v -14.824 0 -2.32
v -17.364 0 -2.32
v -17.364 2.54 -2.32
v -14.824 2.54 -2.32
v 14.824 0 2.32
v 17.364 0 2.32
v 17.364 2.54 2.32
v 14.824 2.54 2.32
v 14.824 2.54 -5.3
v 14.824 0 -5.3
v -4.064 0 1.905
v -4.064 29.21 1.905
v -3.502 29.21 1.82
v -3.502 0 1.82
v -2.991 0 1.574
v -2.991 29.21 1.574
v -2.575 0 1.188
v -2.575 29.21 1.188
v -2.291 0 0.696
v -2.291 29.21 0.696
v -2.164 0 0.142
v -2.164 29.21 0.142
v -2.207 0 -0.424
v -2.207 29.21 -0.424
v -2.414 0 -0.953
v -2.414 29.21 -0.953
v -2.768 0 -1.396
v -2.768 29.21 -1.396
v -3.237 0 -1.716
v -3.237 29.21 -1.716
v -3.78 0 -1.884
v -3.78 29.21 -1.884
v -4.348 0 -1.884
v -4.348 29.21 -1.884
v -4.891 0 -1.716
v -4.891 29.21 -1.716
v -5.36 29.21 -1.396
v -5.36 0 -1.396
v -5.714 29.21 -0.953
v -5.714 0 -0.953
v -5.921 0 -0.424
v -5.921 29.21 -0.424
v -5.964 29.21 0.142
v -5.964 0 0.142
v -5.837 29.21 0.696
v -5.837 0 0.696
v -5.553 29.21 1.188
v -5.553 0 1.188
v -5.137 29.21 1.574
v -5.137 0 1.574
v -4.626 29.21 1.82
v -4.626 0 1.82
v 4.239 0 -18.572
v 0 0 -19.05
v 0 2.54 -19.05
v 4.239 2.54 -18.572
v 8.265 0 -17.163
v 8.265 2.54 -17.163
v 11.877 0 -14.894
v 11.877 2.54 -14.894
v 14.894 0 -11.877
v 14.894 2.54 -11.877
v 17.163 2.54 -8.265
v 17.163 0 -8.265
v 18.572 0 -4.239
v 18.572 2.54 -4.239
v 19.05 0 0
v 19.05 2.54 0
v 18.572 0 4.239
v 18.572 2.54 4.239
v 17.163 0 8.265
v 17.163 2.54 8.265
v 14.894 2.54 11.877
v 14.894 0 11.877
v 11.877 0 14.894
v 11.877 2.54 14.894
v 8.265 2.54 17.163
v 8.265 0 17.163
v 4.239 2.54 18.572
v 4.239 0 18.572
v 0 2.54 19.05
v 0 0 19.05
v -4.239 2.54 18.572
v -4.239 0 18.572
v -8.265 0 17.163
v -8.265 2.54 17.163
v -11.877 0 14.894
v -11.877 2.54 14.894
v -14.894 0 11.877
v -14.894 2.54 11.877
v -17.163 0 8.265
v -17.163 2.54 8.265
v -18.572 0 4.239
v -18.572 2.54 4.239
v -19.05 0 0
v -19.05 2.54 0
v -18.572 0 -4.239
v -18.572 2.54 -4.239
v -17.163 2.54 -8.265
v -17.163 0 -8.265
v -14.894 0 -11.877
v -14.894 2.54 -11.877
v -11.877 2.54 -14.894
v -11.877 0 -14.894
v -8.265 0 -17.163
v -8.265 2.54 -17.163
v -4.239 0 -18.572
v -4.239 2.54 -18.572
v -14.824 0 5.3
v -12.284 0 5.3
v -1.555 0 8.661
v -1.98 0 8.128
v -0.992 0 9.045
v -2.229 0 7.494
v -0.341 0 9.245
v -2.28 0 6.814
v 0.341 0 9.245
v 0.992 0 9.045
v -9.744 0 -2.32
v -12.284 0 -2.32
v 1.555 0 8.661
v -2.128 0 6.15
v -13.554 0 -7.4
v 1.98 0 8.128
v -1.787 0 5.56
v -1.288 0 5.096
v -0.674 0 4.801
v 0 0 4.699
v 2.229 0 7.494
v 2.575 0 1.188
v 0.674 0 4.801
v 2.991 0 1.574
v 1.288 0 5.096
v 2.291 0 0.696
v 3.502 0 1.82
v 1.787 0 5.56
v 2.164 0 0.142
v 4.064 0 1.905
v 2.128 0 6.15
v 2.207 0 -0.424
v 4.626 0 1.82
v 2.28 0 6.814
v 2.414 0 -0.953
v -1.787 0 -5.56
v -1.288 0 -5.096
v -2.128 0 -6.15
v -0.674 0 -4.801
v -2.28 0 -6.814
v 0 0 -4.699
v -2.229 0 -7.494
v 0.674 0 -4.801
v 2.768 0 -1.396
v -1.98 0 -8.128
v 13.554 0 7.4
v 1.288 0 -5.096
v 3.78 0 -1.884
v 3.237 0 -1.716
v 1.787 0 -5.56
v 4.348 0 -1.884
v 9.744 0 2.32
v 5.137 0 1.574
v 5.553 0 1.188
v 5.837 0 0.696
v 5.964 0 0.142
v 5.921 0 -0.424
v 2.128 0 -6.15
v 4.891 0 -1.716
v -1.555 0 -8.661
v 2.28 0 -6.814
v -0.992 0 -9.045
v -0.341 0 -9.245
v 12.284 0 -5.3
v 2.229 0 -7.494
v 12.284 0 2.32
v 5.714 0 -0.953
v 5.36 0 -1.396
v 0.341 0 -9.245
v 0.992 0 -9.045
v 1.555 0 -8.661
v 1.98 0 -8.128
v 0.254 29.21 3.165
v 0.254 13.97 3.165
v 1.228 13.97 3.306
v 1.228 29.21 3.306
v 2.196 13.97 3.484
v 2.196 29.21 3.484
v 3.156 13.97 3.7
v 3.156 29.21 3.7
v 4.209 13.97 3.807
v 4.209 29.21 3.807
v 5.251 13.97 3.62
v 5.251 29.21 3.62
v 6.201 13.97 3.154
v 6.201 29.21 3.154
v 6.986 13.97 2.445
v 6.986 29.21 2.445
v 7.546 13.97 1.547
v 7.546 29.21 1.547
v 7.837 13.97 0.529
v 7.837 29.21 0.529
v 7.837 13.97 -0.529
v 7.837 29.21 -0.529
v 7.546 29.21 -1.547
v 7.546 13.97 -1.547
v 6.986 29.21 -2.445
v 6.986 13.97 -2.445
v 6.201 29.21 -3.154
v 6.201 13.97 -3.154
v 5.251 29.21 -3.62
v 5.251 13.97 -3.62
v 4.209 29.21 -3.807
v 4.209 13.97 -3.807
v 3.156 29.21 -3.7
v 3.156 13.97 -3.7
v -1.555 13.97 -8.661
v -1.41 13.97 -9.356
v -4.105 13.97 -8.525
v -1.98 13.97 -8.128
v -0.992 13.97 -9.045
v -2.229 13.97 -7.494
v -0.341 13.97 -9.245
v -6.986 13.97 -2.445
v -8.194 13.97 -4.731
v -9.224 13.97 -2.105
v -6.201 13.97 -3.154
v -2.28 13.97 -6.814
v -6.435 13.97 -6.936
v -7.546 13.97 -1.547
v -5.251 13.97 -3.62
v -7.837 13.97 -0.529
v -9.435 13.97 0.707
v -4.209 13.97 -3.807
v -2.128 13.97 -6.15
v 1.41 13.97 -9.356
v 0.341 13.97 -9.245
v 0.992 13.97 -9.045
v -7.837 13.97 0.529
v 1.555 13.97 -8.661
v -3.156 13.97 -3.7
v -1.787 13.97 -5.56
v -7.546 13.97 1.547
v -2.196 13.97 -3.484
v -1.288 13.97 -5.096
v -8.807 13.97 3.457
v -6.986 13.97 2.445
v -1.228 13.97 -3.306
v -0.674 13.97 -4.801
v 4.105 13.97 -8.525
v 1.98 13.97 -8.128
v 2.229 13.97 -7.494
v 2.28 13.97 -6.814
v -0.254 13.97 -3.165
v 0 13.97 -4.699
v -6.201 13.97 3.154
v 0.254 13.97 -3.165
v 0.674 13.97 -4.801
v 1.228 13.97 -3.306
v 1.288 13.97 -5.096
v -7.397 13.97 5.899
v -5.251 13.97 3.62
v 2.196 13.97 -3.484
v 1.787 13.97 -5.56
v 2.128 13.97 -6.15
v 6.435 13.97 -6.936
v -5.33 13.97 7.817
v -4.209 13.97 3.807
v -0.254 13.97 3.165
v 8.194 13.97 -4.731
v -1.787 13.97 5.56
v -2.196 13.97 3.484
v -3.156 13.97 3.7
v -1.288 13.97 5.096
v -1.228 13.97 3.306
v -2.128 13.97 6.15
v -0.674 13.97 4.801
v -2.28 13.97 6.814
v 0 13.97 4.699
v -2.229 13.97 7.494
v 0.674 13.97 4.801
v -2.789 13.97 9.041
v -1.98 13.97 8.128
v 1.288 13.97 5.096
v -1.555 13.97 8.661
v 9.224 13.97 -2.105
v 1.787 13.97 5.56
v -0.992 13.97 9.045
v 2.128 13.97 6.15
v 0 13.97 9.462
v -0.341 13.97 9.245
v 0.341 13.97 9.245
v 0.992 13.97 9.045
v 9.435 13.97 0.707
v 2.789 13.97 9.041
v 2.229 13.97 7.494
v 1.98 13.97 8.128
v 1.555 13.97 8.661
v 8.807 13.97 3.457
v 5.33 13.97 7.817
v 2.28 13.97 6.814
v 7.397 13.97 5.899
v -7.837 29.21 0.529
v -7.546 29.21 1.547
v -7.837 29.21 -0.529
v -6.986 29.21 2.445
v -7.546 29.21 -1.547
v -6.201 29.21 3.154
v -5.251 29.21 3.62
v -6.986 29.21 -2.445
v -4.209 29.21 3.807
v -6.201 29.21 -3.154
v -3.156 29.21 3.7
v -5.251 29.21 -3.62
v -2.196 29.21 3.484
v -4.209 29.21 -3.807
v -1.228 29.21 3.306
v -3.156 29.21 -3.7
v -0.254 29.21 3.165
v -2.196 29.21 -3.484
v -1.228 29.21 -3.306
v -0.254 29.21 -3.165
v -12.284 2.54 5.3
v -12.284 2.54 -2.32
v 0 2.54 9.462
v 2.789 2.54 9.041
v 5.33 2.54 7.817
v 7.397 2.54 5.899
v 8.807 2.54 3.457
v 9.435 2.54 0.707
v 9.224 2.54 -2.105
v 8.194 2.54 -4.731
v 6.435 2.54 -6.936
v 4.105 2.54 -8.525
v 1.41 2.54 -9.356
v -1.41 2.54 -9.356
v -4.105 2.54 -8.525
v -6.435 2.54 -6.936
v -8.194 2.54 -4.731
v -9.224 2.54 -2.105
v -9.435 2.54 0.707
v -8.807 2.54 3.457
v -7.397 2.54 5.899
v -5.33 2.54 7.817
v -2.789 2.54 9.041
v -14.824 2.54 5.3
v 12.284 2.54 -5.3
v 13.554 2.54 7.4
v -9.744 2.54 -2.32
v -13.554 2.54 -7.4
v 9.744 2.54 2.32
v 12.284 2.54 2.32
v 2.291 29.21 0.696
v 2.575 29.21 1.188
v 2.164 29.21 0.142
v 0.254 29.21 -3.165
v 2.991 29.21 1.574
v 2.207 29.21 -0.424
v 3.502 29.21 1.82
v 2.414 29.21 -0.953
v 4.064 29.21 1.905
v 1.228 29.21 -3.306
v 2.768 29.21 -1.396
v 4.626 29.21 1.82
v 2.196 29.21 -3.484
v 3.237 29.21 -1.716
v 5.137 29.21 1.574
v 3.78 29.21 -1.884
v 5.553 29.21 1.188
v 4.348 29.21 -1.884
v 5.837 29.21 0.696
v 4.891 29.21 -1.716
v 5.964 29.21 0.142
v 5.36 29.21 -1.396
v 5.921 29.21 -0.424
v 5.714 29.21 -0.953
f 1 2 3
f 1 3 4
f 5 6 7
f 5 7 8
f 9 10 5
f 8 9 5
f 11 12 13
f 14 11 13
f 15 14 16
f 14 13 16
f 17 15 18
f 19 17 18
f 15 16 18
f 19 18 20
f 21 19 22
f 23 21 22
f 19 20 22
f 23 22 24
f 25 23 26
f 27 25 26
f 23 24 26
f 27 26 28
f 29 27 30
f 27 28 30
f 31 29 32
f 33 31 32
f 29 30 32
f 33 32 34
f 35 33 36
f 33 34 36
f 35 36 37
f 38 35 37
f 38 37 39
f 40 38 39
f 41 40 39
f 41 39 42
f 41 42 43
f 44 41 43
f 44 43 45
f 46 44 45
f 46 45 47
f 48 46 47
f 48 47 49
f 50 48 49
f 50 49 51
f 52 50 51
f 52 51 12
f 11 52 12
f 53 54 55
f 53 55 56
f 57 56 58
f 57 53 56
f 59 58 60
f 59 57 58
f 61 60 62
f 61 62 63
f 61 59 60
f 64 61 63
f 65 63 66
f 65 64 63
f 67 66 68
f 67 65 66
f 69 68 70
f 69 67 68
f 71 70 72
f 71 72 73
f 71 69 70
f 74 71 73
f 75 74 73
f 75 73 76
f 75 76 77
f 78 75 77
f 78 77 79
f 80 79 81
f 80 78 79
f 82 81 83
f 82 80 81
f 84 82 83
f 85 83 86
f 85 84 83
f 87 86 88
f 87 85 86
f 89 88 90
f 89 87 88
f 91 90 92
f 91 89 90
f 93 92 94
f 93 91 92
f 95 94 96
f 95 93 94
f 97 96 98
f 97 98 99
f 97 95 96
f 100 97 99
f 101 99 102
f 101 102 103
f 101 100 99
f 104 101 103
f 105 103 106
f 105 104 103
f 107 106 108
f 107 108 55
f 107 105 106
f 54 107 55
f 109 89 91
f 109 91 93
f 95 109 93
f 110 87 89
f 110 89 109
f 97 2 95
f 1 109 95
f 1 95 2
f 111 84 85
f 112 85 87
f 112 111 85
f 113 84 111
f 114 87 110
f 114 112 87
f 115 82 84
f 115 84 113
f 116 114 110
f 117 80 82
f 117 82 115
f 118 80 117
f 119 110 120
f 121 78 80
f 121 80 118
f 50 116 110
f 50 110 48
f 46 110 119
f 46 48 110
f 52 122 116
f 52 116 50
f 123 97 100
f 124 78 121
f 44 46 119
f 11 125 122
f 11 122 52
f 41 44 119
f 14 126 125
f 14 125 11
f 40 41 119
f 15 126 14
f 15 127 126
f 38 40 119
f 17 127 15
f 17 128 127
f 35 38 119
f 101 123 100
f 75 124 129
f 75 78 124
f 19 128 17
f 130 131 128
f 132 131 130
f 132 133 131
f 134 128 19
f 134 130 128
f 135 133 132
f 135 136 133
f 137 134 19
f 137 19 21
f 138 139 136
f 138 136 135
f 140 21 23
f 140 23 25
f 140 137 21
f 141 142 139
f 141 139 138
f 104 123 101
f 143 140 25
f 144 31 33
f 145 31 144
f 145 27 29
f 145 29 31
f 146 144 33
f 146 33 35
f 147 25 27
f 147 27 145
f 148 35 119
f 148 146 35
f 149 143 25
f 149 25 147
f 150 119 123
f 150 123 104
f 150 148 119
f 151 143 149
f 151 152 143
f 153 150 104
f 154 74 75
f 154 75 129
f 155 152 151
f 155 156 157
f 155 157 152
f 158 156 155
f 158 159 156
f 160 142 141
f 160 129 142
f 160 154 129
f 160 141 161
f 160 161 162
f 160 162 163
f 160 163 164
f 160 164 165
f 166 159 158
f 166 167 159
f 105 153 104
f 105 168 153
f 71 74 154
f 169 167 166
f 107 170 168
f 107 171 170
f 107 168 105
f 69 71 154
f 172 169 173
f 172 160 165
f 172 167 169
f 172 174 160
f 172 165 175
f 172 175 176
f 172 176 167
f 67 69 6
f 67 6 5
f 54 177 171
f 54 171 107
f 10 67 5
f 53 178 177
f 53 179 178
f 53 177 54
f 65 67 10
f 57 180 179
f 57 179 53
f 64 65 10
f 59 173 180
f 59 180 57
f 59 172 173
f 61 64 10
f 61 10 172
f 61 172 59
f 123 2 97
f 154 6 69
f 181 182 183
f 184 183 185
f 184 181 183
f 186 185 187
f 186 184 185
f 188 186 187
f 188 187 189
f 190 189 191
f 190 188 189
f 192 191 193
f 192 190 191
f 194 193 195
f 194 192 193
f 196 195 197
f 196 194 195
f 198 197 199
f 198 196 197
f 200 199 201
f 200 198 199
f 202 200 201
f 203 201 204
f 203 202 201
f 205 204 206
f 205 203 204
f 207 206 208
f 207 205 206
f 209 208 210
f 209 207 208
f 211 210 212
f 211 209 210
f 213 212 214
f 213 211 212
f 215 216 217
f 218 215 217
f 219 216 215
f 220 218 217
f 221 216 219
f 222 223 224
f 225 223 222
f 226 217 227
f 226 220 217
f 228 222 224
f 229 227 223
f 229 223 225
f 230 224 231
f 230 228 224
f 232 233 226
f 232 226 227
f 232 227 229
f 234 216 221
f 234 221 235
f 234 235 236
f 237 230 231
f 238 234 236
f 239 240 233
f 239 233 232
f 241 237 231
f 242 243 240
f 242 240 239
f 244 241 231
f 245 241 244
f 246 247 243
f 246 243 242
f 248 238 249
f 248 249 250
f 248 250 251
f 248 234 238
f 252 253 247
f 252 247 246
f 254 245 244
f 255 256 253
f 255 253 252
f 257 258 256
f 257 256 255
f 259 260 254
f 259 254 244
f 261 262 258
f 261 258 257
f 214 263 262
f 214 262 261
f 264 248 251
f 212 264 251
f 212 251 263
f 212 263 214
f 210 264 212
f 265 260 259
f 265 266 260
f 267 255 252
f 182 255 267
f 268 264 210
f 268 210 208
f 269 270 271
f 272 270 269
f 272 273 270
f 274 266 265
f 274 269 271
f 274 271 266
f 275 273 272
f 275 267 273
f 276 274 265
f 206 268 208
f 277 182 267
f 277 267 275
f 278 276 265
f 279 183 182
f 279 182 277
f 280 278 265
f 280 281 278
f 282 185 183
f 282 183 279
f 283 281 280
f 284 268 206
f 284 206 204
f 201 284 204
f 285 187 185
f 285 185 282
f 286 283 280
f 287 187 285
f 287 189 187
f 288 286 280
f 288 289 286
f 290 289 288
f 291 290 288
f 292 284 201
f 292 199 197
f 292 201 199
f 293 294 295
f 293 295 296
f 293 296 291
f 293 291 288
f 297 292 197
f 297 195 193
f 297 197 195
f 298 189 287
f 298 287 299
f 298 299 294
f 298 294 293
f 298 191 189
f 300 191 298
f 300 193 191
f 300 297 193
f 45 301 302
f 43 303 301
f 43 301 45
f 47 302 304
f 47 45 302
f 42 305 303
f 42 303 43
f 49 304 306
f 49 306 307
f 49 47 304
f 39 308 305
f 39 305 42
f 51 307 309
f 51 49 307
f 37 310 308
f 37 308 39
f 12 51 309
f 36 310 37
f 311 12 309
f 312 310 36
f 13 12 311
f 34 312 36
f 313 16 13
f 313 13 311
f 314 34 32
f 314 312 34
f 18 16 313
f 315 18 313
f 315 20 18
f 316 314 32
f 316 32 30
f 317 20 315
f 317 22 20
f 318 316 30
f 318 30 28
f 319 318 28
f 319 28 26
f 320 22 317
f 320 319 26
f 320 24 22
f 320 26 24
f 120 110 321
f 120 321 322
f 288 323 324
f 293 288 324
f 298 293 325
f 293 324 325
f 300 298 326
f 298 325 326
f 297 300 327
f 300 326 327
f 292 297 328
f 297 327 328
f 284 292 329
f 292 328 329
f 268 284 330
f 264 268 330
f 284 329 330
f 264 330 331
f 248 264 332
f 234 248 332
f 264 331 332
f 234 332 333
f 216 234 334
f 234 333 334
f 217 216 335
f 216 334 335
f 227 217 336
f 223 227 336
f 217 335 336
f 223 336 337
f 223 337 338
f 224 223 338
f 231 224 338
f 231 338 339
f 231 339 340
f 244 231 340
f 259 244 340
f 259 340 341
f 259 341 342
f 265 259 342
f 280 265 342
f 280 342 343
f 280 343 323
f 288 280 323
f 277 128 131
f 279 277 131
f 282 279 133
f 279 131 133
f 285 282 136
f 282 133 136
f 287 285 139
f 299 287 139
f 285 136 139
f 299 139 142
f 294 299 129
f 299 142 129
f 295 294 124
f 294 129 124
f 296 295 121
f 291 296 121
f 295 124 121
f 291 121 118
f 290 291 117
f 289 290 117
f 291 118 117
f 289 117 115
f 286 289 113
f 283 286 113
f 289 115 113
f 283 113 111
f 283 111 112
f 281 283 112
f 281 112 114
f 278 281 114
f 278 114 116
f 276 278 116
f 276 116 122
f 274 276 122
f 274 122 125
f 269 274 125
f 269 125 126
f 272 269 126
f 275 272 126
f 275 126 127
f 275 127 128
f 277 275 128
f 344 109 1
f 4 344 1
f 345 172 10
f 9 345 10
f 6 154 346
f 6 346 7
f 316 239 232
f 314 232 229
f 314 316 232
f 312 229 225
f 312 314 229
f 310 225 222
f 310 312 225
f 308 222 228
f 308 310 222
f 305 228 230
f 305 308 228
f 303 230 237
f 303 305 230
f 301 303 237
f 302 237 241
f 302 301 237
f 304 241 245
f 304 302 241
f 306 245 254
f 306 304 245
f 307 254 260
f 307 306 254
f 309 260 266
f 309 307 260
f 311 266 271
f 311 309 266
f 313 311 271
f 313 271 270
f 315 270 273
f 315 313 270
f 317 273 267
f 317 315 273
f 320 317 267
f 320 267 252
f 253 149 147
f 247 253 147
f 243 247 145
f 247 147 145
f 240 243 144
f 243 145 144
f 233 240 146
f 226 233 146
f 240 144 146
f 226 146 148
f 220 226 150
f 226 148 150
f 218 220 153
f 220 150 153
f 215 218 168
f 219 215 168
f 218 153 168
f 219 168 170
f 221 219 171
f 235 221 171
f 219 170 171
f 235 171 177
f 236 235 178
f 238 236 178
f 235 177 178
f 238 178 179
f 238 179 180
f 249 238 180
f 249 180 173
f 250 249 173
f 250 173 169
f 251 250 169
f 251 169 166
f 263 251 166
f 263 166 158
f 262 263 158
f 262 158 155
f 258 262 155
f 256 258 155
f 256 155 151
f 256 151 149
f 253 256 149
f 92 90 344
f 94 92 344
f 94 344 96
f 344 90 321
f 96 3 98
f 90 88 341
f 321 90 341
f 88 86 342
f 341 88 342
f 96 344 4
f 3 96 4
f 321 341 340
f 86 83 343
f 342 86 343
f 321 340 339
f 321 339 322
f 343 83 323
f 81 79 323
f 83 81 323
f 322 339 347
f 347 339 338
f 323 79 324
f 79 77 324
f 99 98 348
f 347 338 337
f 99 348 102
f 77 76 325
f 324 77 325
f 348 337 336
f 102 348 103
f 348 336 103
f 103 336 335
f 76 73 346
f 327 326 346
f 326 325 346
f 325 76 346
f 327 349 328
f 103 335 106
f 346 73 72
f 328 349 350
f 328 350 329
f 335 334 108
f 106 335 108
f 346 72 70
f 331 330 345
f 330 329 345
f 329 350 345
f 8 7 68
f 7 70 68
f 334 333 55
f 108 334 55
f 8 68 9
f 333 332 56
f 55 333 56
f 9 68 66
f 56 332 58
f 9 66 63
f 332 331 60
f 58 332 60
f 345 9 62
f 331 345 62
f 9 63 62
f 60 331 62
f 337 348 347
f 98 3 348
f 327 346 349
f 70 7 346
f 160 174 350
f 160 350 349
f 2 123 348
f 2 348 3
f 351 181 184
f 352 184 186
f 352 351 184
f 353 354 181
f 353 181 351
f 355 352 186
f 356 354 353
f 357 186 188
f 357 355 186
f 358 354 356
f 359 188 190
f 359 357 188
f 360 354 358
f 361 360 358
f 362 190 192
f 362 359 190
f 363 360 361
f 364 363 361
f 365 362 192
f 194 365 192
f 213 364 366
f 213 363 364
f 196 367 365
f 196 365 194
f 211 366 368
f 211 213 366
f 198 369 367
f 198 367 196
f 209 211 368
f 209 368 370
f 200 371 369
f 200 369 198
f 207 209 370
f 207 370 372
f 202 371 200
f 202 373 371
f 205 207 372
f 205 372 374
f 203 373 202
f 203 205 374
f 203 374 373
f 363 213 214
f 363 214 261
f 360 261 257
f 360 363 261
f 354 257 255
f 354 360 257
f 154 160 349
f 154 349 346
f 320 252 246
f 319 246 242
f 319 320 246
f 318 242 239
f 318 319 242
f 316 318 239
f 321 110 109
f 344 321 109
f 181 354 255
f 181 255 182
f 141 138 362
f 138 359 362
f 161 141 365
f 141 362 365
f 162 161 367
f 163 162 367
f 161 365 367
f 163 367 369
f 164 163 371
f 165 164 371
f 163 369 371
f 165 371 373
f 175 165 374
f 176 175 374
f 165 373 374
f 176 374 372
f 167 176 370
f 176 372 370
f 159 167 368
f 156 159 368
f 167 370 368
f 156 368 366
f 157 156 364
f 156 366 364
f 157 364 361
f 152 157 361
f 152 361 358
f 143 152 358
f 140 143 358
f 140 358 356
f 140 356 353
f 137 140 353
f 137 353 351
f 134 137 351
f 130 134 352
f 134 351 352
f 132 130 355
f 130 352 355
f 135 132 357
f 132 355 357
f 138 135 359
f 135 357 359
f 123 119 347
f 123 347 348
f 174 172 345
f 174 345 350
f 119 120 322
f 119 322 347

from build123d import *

# Parameters (mm, degrees)
SKETCH1_R           = 9.4615
BOSS_EXTRUDE1_DEPTH = 13.97
SKETCH2_R           = 1.905
CUT_EXTRUDE1_DEPTH  = 20.344272137
BOSS_EXTRUDE2_START = 15.24
SKETCH4_R           = 1.905
BOSS_EXTRUDE2_DEPTH = 15.24
FILLET1_R           = 25.4
SKETCH5_R           = 2.286
CUT_EXTRUDE2_DEPTH  = 33.12886653
SKETCH6_R           = 19.05
SKETCH6_R_2         = 9.4615
BOSS_EXTRUDE3_DEPTH = 2.54
SKETCH7_W           = 2.54
SKETCH7_H           = 7.62
CUT_EXTRUDE3_DEPTH  = 40.736999132
CIRPATTERN1_COUNT   = 2


with BuildPart() as part:
    # Sketch1 → Boss-Extrude1 (new body)
    with BuildSketch(Plane(origin=(0, 0, 0), x_dir=(1, 0, 0), z_dir=(0, 1, 0))):
        with Locations(Location((0, 0, 0), (0, 0, 270))):
            Circle(SKETCH1_R)
    extrude(amount=BOSS_EXTRUDE1_DEPTH)

    # Sketch2 → Cut-Extrude1 (cut, through all)
    with BuildSketch(Plane(origin=(0, 13.97, 0), x_dir=(1, 0, 0), z_dir=(0, 1, 0))):
        with Locations(Location((-4.064, 0, 0), (0, 0, 270))):
            Circle(SKETCH2_R)
        with Locations(Location((4.064, 0, 0), (0, 0, 270))):
            Circle(SKETCH2_R)
    extrude(amount=-CUT_EXTRUDE1_DEPTH, mode=Mode.SUBTRACT)

    # Sketch4 → Boss-Extrude2 (add)
    # profile 1 of 2: a face of its own
    with BuildSketch(Plane(origin=(0, 13.97, 0), x_dir=(1, 0, 0), z_dir=(0, 1, 0)).offset(BOSS_EXTRUDE2_START)):
        with BuildLine():
            Line((-0.254, -3.164823692), (-0.254, 3.164823692))
            ThreePointArc((-0.254, 3.164823692), (-0.888489589, 3.048148824), (-1.486296875, 2.805627666))
            ThreePointArc((-1.486296875, 2.805627666), (-7.874, 0), (-1.486296875, -2.805627666))
            ThreePointArc((-1.486296875, -2.805627666), (-0.888489589, -3.048148824), (-0.254, -3.164823692))
        make_face()
        with Locations(Location((-4.064, 0, 0), (0, 0, 270))):
            Circle(SKETCH4_R, mode=Mode.SUBTRACT)
    # profile 2 of 2: a face of its own
    with BuildSketch(Plane(origin=(0, 13.97, 0), x_dir=(1, 0, 0), z_dir=(0, 1, 0)).offset(BOSS_EXTRUDE2_START)):
        with BuildLine():
            ThreePointArc((1.486296875, 2.805627666), (0.888489589, 3.048148824), (0.254, 3.164823692))
            Line((0.254, 3.164823692), (0.254, -3.164823692))
            ThreePointArc((0.254, -3.164823692), (0.888489589, -3.048148824), (1.486296875, -2.805627666))
            ThreePointArc((1.486296875, -2.805627666), (7.874, 0), (1.486296875, 2.805627666))
        make_face()
        with Locations(Location((4.064, 0, 0), (0, 0, 270))):
            Circle(SKETCH4_R, mode=Mode.SUBTRACT)
    extrude(amount=-BOSS_EXTRUDE2_DEPTH)

    # Fillet1
    # the kernel refuses this fillet: 25.4 mm, written as the material it adds along each edge
    with BuildSketch(Plane(origin=(1.486296875, 29.21, -2.805627666), x_dir=(-0.9600468735563171, 0, -0.27983924059134535), z_dir=(0, -1, 0)), Plane(origin=(-1.486296875, 29.21, 2.805627666), x_dir=(0.960046873556317, 0, 0.27983924059134513), z_dir=(0, -1, 0))) as fillet1_piece_1:
        with BuildLine():
            CenterArc((11.360363176, 23.315626496), FILLET1_R, 239.965558217, 6.660918352)
            Line((-1.352857448, 1.32621947), (-1.60712186, 0.886431329))
            ThreePointArc((-1.60712186, 0.886431329), (-0.948303715, 0.385773959), (-0.434645406, -0.262958878))
            Line((-0.434645406, -0.262958878), (0.102686392, -0.497513321))
            ThreePointArc((0.102686392, -0.497513321), (0.641789953, -0.442458258), (1.08204424, -0.46631253))
            Line((1.08204424, -0.46631253), (1.283579905, 0))
        make_face()
    extrude(amount=19.97621774)
    with BuildSketch(Plane(origin=(-1.486296875, 29.21, -2.805627666), x_dir=(-0.881470671461199, 0, -0.4722387694310403), z_dir=(0, -1, 0)), Plane(origin=(1.486296875, 29.21, 2.805627666), x_dir=(0.8814706714611991, 0, 0.47223876943104), z_dir=(0, -1, 0))) as fillet1_piece_2:
        with BuildLine():
            CenterArc((8.209444083, 24.602465695), FILLET1_R, 248.943194802, 6.660918352)
            Line((-0.916607265, 0.898559122), (-1.099128292, 0.424480991))
            ThreePointArc((-1.099128292, 0.424480991), (-0.768042747, 0.133319135), (-0.421608522, -0.283390639))
            Line((-0.421608522, -0.283390639), (0.12629914, -0.492049314))
            ThreePointArc((0.12629914, -0.492049314), (0.947243548, -0.388369854), (1.768187956, -0.492049314))
            Line((1.768187956, -0.492049314), (1.894487096, 0))
        make_face()
    extrude(amount=19.97621774)

    # Sketch5 → Cut-Extrude2 (cut, through all)
    with BuildSketch(Plane.XZ):
        with Locations(Location((0, 6.985, 0), (0, 0, 270))):
            Circle(SKETCH5_R)
        with Locations(Location((0, -6.985, 0), (0, 0, 90))):
            Circle(SKETCH5_R)
    extrude(amount=-CUT_EXTRUDE2_DEPTH, mode=Mode.SUBTRACT)

    # Sketch6 → Boss-Extrude3 (add)
    with BuildSketch(Plane.XZ):
        with Locations(Location((0, 0, 0), (0, 0, 270))):
            Circle(SKETCH6_R)
        with Locations(Location((0, 0, 0), (0, 0, 90))):
            Circle(SKETCH6_R_2, mode=Mode.SUBTRACT)
    extrude(amount=-BOSS_EXTRUDE3_DEPTH)

    # Sketch7 → Cut-Extrude3 (cut, through all)
    with BuildSketch(Plane.XZ):
        with Locations((13.554224028, -1.490382181)):
            Rectangle(SKETCH7_W, SKETCH7_H)
        Polygon((17.364224028, 2.319617819), (14.824224028, 2.319617819), (12.284224028, 2.319617819), (9.744224028, 2.319617819), (13.554224028, 7.399617819), align=None)
    cut_extrude3 = extrude(amount=-CUT_EXTRUDE3_DEPTH, mode=Mode.SUBTRACT)

    # CirPattern1: Cut-Extrude3 ×2 about axis
    cirpattern1_axis = Axis((0, 0, 0), (0, 1, 0))
    for i in range(1, CIRPATTERN1_COUNT):
        add(cut_extrude3.rotate(cirpattern1_axis, i * 360 / CIRPATTERN1_COUNT), mode=Mode.SUBTRACT)


solid = part.part
